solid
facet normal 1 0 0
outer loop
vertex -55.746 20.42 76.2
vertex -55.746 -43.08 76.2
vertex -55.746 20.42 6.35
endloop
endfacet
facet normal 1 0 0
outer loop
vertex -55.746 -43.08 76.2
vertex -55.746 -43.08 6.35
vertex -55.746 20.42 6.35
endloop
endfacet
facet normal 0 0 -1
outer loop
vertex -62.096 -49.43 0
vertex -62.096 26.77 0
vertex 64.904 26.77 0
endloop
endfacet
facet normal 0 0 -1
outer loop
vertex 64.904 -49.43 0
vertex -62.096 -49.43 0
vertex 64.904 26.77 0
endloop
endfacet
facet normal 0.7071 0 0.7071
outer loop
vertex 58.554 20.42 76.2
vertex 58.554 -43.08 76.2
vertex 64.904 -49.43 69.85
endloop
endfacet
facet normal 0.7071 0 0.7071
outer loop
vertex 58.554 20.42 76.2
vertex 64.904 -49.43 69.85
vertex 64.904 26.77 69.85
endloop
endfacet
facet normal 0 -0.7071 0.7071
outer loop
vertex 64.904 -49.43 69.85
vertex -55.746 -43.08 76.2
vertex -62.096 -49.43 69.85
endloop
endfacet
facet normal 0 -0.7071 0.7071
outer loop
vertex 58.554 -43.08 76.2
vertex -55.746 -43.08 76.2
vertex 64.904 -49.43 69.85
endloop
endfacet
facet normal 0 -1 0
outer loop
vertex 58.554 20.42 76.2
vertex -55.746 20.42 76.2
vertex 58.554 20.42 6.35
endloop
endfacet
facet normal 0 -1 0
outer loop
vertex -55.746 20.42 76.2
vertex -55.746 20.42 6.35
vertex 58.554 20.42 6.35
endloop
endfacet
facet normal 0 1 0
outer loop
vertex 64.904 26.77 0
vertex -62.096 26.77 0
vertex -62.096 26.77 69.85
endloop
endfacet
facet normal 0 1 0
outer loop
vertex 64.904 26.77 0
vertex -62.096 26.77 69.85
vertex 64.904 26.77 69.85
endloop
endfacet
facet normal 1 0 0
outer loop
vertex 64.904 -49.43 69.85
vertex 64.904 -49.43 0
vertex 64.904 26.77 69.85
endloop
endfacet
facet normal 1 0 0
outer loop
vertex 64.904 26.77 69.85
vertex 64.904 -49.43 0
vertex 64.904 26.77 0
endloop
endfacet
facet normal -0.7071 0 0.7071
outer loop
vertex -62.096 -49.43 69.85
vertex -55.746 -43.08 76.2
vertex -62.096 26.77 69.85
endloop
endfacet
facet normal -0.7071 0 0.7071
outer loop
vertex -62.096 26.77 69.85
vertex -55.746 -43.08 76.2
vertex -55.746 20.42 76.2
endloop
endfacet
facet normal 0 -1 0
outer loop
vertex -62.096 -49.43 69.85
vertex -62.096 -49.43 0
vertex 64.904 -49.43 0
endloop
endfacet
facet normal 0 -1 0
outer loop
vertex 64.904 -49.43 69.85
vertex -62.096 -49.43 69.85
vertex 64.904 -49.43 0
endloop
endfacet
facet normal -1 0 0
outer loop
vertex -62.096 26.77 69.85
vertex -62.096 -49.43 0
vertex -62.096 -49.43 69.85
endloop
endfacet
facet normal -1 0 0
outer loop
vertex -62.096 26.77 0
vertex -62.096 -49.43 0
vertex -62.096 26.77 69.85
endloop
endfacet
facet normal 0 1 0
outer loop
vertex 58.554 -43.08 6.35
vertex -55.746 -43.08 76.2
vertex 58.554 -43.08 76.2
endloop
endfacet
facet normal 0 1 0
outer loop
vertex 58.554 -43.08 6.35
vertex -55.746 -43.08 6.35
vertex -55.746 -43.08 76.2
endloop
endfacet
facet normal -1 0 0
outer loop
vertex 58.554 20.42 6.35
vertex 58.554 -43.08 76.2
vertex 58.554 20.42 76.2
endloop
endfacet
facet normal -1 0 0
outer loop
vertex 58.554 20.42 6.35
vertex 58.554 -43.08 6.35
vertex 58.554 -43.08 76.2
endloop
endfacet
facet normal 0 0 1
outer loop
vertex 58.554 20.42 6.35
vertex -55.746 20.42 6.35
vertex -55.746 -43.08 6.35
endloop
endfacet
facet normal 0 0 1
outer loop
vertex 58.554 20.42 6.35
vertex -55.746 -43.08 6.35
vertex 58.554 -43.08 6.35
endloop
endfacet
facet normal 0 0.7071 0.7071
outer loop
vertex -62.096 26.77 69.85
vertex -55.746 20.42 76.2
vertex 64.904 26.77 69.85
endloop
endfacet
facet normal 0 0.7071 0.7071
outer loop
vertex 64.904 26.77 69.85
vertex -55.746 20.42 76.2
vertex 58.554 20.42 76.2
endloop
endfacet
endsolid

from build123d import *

# Parameters (mm, degrees)
F0_W     = 127
F0_H     = 76.2
F1_DEPTH = 76.2
F2_T     = -6.35
F3_SIZE  = 6.34999


# Not quite as in the source:
# - a fillet or chamfer is up to 0.001 mm smaller than in the source, because OpenCascade refuses the exact size


with BuildPart() as f1:
    # F0 (on Top) → F1 (new body)
    with BuildSketch(Plane.XY):
        with Locations((1.4040806768, -11.3298352808)):
            Rectangle(F0_W, F0_H)
    extrude(amount=F1_DEPTH)

    # F2
    f2_openings = [f1.faces().sort_by_distance(p)[0] for p in [
        (1.404081, -11.329835, 76.2),
    ]]
    offset(amount=F2_T, openings=f2_openings)

    # F3 (size 6.35 in the source; OpenCascade refuses exactly that, so slightly less here)
    f3_edges = [f1.edges().sort_by_distance(p)[0] for p in [
        (1.404081, -49.429835, 76.2),
        (1.404081, 26.770165, 76.2),
        (64.904081, -11.329835, 76.2),
        (-62.095919, -11.329835, 76.2),
    ]]
    chamfer(f3_edges, length=F3_SIZE)


solid = f1.part
